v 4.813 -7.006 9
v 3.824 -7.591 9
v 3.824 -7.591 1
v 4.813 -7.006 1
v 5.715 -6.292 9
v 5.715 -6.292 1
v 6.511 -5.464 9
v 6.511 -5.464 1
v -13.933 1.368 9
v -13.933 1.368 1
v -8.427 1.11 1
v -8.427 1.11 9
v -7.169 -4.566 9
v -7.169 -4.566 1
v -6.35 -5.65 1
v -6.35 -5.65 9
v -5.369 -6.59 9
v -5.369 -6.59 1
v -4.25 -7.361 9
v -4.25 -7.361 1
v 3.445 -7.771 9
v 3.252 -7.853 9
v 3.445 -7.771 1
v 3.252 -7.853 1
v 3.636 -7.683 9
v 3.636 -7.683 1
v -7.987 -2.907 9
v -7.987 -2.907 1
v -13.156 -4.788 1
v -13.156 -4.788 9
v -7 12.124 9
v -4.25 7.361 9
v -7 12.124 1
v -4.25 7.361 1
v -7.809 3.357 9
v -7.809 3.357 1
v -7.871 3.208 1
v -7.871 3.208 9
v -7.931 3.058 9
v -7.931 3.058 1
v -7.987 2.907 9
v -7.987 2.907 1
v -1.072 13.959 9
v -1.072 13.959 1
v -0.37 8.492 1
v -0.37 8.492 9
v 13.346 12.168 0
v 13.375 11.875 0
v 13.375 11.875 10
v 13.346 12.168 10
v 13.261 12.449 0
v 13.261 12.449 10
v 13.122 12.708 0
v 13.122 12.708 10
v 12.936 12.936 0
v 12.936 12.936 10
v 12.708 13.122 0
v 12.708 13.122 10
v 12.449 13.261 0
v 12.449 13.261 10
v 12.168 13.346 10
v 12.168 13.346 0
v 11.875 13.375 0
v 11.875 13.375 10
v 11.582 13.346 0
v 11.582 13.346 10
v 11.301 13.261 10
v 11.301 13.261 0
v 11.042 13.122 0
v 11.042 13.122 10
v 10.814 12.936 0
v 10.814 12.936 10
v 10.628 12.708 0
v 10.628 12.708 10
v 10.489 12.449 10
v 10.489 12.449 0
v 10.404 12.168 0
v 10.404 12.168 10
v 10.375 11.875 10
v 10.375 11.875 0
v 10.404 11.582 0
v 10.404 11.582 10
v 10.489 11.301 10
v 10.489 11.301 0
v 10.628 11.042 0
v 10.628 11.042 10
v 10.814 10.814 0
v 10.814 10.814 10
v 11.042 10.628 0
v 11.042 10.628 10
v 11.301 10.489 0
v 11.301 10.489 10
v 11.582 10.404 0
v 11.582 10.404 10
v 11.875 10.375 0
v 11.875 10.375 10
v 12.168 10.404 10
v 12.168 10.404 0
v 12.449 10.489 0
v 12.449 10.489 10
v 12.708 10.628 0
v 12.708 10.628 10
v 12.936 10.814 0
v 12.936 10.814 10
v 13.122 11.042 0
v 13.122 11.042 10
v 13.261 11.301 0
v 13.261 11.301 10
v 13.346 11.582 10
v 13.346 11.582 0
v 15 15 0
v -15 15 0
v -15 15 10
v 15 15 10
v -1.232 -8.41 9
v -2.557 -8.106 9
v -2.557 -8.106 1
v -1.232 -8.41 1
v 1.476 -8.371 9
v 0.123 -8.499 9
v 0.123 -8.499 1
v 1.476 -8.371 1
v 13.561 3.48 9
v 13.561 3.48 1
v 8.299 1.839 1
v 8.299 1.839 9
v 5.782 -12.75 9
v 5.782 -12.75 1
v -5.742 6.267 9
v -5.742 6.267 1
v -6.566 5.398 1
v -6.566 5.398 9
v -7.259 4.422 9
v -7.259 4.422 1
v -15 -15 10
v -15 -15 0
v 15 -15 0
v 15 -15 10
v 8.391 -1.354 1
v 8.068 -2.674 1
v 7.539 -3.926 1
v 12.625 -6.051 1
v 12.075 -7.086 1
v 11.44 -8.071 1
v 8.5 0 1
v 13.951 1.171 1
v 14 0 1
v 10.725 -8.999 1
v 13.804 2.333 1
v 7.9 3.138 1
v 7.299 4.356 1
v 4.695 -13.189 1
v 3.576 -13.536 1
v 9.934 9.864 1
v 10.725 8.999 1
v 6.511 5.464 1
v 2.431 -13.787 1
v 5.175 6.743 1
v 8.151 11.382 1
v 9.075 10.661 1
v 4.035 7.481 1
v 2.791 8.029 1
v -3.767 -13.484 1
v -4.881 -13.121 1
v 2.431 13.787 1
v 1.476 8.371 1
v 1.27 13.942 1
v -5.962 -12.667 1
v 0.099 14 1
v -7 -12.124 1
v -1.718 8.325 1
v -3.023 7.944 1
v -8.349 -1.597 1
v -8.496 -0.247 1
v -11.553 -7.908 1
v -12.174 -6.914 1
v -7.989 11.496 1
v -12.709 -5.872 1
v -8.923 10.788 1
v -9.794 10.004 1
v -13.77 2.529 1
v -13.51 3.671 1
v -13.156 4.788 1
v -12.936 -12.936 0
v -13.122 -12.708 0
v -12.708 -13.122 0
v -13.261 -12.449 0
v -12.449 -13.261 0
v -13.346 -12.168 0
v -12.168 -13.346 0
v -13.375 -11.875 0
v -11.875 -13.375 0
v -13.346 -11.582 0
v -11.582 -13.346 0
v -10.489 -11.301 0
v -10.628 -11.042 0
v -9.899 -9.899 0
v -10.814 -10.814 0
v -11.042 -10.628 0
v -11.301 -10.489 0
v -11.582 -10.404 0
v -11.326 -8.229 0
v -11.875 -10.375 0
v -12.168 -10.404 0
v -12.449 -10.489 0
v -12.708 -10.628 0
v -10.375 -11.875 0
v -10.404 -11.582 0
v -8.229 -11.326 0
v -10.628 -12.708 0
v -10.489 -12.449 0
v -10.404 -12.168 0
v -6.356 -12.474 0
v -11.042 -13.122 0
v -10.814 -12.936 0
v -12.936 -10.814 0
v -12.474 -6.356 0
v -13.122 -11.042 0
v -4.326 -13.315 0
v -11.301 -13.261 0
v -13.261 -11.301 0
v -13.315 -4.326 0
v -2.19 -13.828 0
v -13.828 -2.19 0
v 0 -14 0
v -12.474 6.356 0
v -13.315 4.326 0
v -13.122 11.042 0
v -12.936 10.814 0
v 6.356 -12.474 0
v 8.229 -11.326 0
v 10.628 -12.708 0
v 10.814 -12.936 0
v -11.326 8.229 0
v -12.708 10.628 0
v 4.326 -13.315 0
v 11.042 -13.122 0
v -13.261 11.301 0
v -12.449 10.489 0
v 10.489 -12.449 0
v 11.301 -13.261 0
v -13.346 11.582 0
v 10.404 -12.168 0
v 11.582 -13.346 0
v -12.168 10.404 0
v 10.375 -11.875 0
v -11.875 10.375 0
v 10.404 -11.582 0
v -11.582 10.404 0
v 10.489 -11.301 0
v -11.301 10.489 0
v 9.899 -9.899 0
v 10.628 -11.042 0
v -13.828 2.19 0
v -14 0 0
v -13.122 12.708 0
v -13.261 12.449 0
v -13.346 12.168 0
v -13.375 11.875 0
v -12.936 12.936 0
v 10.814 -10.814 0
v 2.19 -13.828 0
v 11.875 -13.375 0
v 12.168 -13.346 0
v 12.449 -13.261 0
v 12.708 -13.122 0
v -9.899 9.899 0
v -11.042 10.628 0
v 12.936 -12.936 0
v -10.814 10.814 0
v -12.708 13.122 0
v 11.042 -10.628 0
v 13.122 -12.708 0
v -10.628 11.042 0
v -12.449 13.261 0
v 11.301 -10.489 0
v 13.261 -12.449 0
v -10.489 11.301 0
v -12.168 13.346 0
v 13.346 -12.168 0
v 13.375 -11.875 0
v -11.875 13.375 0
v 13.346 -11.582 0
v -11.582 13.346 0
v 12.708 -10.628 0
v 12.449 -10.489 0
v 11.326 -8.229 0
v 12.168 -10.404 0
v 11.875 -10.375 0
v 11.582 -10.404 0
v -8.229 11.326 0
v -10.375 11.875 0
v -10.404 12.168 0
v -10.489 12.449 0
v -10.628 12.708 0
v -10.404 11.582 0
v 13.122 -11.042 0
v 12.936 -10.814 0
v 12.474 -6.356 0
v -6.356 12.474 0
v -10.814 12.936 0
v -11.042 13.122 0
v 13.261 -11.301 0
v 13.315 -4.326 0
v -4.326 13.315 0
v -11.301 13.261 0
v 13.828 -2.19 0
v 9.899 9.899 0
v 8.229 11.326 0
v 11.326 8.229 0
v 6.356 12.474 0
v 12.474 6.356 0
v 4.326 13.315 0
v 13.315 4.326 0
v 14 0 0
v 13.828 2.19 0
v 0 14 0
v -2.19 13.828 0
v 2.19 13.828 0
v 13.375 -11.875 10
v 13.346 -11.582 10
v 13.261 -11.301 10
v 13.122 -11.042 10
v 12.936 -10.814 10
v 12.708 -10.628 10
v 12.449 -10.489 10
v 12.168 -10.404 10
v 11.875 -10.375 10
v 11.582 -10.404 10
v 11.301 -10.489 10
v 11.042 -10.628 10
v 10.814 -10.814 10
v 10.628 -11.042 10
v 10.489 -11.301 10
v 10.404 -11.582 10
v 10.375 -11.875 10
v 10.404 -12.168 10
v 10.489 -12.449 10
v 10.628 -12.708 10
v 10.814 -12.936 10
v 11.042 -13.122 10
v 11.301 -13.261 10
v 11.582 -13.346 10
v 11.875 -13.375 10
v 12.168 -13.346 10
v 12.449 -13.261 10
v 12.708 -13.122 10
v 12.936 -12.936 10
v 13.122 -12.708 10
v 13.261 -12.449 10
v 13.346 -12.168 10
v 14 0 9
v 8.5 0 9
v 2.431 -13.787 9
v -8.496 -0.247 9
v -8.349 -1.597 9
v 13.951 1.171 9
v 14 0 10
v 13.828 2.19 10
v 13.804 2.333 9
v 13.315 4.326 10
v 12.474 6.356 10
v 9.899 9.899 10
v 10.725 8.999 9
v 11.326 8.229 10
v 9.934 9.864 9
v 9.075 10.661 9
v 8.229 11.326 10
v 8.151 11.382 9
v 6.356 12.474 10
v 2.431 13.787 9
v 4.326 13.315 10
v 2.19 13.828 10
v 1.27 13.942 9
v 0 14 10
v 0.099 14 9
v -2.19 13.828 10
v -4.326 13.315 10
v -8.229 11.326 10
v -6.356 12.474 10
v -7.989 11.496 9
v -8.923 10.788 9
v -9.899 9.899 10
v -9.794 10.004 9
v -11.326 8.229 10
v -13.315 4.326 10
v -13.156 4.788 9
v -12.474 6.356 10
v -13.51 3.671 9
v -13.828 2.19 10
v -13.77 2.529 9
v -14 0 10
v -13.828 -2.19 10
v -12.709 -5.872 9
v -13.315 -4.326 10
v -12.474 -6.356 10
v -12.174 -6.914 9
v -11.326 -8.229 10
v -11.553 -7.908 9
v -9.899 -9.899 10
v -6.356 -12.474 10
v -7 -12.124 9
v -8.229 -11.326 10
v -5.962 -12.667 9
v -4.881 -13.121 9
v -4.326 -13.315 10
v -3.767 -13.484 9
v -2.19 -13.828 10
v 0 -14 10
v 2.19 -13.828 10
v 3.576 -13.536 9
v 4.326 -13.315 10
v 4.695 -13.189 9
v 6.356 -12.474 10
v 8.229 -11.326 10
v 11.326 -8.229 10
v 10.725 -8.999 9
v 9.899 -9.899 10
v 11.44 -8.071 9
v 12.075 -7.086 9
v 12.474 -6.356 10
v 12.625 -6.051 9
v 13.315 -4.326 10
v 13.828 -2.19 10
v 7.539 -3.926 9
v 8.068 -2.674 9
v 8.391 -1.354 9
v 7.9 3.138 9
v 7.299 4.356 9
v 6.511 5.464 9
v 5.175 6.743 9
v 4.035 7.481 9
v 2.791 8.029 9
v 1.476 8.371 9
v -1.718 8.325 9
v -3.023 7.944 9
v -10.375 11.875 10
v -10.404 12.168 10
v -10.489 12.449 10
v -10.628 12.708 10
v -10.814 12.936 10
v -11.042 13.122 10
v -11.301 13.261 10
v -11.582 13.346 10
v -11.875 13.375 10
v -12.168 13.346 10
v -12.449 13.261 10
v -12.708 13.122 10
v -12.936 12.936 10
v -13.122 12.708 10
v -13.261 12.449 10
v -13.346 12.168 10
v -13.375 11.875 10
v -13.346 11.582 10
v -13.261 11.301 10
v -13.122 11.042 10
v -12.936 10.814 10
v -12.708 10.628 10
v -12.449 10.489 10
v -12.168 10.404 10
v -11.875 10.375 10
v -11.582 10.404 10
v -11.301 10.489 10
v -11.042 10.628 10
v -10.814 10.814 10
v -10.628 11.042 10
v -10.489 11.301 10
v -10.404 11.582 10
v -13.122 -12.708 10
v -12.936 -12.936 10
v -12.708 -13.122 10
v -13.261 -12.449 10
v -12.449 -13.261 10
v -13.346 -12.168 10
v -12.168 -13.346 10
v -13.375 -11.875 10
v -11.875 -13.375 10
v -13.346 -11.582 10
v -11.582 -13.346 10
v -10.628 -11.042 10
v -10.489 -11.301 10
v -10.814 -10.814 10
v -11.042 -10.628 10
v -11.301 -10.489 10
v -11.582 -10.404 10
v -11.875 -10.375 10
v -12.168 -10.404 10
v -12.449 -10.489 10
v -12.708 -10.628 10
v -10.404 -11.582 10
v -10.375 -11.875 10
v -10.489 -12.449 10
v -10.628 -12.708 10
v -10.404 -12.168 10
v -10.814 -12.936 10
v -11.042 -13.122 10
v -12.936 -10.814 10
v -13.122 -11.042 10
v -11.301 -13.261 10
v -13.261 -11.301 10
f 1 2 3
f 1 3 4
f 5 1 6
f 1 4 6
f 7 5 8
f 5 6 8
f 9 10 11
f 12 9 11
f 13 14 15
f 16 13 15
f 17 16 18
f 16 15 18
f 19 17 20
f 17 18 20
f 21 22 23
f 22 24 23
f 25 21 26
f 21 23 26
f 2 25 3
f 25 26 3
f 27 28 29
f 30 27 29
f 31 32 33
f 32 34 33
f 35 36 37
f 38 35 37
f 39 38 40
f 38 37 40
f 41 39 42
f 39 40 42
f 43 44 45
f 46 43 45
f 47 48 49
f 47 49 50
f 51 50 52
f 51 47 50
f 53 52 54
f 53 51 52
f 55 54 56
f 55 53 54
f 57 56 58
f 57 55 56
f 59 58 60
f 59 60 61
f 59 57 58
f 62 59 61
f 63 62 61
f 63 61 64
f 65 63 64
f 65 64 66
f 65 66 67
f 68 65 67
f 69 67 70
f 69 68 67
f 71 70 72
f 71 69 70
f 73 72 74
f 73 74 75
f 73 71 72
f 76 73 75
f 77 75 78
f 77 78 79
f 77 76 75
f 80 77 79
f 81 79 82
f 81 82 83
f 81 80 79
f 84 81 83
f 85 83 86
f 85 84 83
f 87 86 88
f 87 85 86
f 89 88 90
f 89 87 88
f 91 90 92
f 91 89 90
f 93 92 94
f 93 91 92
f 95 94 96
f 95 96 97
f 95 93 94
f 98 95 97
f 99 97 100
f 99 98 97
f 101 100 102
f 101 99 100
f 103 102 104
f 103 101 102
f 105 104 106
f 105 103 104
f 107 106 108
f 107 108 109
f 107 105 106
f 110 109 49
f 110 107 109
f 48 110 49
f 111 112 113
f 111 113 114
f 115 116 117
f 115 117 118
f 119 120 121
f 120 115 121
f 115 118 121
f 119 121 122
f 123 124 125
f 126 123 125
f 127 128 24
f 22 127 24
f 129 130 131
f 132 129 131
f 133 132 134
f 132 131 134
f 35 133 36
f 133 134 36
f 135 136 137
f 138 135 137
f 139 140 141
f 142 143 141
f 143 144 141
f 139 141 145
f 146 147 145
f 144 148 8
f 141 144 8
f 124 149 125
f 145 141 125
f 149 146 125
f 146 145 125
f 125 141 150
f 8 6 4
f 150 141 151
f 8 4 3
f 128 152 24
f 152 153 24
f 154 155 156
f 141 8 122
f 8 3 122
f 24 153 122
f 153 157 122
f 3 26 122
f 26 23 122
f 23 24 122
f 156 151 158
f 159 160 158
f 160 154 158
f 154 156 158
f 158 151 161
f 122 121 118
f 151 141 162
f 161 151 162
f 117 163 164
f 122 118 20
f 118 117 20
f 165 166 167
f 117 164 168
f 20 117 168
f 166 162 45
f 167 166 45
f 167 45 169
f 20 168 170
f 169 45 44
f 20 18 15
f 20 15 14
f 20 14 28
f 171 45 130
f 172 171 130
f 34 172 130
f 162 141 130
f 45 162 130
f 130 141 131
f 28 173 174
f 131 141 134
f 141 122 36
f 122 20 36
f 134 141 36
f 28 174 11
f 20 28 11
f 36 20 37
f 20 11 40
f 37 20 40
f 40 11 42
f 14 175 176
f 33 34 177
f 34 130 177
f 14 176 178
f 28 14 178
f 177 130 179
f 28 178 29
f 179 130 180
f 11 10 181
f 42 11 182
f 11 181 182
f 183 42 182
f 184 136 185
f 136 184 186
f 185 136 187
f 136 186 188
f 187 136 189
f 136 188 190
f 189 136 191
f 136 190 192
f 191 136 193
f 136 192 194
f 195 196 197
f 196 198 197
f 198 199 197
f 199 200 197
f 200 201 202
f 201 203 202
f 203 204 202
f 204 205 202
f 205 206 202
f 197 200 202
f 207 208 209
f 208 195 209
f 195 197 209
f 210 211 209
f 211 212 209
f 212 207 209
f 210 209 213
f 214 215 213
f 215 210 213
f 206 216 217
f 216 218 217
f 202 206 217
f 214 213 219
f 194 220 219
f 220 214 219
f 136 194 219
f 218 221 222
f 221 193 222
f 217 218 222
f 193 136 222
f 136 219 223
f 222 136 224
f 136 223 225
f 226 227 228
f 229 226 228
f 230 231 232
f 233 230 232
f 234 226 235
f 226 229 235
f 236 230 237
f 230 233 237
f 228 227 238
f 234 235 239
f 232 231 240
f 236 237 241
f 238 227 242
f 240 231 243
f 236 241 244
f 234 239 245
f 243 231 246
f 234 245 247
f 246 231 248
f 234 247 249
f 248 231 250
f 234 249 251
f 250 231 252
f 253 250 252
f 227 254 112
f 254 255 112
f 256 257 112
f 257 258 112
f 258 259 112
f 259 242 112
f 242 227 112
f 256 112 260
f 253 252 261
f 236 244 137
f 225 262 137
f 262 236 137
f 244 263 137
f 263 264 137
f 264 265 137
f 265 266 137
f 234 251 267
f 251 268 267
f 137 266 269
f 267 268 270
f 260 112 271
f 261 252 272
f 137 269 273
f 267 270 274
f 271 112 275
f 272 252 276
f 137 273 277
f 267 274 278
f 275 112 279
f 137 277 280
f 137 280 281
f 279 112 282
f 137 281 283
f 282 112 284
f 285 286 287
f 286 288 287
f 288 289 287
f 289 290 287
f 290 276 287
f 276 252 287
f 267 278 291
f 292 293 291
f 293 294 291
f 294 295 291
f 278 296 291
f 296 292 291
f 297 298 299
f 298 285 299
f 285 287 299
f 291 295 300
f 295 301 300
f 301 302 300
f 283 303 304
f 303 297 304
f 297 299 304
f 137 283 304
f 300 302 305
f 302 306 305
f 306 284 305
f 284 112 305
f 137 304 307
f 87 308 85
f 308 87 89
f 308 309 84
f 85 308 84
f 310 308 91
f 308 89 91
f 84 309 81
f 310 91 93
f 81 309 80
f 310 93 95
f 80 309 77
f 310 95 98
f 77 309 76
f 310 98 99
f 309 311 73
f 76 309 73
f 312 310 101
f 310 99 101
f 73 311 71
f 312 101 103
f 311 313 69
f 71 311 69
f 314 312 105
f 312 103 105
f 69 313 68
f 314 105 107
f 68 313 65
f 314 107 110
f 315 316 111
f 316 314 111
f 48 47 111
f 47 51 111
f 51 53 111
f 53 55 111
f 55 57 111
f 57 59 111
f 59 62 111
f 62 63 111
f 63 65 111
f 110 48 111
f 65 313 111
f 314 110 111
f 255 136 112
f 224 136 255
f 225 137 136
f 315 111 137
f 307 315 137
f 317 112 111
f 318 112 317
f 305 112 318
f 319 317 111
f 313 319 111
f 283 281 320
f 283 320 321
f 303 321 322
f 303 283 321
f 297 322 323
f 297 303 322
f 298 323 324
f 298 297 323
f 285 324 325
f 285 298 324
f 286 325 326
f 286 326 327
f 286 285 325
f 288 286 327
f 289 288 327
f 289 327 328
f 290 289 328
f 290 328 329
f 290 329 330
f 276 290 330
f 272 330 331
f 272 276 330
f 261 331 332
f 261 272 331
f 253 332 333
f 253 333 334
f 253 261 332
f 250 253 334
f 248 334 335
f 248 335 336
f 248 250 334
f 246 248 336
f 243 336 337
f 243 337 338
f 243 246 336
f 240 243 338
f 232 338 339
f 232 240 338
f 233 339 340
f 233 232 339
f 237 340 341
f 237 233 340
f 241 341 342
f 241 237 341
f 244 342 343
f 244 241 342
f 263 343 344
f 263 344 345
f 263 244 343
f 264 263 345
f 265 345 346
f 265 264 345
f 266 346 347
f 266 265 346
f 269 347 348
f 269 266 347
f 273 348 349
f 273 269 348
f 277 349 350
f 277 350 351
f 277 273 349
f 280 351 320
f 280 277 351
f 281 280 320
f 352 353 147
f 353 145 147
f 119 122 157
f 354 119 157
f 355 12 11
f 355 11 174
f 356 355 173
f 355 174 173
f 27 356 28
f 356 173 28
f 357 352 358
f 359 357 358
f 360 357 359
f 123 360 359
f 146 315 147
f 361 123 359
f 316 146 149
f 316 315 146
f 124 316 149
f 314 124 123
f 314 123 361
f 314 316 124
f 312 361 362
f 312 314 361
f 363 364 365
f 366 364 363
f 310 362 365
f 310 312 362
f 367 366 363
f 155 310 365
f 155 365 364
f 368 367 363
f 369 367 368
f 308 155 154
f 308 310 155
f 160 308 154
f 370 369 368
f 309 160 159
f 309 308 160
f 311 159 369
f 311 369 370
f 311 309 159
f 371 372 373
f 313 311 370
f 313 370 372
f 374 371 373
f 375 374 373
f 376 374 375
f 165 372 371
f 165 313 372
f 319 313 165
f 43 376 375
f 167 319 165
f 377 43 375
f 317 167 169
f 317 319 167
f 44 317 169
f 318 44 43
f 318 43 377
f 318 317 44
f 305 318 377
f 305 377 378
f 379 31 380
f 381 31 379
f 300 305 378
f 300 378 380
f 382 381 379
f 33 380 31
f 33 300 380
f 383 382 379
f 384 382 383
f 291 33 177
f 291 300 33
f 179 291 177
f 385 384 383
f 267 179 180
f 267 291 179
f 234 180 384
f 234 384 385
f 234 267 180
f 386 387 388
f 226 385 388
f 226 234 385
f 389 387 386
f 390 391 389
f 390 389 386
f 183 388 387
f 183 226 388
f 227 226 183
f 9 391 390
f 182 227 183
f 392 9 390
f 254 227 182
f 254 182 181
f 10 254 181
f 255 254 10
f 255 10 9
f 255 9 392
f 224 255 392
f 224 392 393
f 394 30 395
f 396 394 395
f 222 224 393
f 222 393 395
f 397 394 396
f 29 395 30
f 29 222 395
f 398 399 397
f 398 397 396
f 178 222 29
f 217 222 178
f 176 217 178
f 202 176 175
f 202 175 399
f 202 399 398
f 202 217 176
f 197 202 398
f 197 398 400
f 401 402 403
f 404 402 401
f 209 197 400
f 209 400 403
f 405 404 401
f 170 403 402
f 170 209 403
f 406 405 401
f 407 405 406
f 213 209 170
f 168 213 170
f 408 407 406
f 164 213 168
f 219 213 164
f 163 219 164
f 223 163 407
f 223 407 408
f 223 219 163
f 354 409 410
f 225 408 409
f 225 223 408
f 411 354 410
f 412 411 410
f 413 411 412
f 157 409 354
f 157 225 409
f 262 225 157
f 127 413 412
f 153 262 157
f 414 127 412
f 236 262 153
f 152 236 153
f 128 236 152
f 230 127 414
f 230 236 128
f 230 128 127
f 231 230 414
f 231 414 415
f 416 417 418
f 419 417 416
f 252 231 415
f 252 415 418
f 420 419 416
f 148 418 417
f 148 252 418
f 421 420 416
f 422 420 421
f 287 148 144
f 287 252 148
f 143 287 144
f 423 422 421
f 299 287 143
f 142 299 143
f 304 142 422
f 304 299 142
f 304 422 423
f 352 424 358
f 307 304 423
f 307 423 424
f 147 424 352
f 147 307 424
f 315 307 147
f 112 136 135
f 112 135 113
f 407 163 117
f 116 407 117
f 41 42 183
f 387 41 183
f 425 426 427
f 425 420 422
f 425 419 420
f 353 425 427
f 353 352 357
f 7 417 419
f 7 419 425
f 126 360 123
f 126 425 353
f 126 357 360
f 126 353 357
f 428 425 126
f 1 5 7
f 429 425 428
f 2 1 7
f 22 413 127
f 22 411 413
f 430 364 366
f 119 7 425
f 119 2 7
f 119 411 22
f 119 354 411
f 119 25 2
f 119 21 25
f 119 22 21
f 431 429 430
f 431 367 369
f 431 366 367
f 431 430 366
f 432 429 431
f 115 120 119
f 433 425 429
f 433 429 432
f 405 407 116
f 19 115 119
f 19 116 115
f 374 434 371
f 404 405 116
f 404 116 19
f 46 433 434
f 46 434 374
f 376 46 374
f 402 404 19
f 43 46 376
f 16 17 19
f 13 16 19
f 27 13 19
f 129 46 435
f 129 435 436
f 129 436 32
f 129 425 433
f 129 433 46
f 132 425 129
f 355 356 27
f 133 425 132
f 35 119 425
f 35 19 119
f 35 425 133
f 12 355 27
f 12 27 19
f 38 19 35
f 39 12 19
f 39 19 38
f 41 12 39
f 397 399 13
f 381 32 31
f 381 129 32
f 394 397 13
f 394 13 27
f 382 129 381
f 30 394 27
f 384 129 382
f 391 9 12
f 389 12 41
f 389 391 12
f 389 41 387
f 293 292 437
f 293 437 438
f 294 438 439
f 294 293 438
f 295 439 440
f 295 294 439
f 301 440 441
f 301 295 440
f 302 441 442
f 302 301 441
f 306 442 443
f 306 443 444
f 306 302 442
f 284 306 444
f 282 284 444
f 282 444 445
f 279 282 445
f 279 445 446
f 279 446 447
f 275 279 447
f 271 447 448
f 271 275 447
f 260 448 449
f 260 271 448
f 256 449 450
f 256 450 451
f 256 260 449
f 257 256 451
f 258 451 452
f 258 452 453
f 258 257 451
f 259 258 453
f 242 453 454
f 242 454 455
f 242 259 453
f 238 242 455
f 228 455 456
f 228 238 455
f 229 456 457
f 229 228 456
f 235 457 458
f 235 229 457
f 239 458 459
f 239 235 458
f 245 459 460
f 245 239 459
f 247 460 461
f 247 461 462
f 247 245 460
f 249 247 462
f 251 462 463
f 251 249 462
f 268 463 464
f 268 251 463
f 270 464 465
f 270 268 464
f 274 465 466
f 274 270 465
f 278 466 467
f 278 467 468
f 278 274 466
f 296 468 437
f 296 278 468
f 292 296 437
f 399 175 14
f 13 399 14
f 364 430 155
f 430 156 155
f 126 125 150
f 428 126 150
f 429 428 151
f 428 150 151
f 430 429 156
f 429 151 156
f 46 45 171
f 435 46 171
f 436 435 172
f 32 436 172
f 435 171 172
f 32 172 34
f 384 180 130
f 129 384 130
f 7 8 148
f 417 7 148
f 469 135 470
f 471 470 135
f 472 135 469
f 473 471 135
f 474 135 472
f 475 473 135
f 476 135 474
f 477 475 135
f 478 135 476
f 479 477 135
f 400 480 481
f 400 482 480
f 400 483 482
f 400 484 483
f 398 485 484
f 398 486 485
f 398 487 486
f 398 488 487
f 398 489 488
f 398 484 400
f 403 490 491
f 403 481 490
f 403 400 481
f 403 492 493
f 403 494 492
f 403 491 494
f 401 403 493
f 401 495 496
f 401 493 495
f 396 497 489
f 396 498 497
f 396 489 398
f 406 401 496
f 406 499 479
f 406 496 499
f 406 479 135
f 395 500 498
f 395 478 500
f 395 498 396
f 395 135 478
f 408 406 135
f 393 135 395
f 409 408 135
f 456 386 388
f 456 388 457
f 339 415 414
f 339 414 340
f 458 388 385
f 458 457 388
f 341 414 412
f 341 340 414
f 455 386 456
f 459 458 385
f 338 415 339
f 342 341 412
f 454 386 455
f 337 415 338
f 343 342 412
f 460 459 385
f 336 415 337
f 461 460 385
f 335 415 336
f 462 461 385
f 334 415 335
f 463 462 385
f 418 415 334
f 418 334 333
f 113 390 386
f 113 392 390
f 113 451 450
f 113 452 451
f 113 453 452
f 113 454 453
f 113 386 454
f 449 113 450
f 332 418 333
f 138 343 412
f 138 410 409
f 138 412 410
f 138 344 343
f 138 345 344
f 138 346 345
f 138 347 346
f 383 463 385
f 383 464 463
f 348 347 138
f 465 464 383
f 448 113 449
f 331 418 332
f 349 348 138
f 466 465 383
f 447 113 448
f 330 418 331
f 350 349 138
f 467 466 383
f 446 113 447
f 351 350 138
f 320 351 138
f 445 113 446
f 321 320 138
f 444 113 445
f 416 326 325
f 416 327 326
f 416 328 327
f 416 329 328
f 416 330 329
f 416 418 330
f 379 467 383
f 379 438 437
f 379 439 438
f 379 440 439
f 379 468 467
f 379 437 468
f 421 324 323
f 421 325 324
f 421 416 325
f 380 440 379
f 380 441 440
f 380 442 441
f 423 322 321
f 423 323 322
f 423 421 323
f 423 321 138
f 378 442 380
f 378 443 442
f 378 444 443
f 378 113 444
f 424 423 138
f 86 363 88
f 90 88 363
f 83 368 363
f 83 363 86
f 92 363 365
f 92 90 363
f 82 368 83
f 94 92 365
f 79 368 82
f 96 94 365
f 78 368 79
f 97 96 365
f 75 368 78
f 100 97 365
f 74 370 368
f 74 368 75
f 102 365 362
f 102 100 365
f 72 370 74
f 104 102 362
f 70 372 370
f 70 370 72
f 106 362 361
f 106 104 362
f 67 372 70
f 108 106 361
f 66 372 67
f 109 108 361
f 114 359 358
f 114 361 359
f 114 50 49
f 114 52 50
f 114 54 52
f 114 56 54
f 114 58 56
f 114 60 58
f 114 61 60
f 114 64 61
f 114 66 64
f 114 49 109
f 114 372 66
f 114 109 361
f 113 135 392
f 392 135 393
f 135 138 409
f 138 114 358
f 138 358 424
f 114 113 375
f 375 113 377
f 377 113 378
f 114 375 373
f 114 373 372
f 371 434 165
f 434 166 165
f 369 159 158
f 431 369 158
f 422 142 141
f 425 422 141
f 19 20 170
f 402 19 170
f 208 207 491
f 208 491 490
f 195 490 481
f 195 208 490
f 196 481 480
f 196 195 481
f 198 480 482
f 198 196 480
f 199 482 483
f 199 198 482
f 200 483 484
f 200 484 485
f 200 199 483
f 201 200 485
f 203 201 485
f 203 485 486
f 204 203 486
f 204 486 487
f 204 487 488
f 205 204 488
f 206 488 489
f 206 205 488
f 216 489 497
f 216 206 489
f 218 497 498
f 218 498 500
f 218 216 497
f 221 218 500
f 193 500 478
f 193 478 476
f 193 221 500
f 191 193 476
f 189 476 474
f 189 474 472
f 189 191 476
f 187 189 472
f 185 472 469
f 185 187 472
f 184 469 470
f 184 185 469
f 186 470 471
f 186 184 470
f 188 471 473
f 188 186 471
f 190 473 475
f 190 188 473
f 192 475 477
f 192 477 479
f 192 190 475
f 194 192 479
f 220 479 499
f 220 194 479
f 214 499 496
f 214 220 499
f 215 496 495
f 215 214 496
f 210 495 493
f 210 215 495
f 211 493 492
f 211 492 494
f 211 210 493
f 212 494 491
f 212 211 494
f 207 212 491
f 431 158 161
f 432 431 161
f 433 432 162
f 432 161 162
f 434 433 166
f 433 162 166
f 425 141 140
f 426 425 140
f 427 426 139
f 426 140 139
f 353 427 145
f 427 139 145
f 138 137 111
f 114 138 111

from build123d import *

# Parameters (mm, degrees)
SKETCH051_W           = 30
SKETCH051_H           = 30
SKETCH051_R           = 14
SKETCH051_R_2         = 1.5
PAD022_DEPTH          = 10
PAD023_DEPTH          = 8
POLARPATTERN001_COUNT = 9


with BuildPart() as part:
    # Sketch051 → Pad022 (new body)
    with BuildSketch(Plane.XY):
        Rectangle(SKETCH051_W, SKETCH051_H)
        Circle(SKETCH051_R, mode=Mode.SUBTRACT)
        with Locations((-11.875, 11.875)):
            Circle(SKETCH051_R_2, mode=Mode.SUBTRACT)
        with Locations((11.875, 11.875)):
            Circle(SKETCH051_R_2, mode=Mode.SUBTRACT)
        with Locations((-11.875, -11.875)):
            Circle(SKETCH051_R_2, mode=Mode.SUBTRACT)
        with Locations((11.875, -11.875)):
            Circle(SKETCH051_R_2, mode=Mode.SUBTRACT)
    extrude(amount=PAD022_DEPTH)

    # Sketch052 → Pad023 (join)
    with BuildSketch(Plane.XY.offset(1)):
        with BuildLine():
            ThreePointArc((8.298704, 1.838887), (-8.449526, -0.924936), (8.5, 0))
            Line((8.5, 0), (14.143682, 0))
            Line((14.143682, 0), (13.972063, 3.60798))
            Line((13.972063, 3.60798), (8.298704, 1.838887))
        make_face()
    pad023 = extrude(amount=PAD023_DEPTH)

    # PolarPattern001: Pad023 ×9 about axis
    polarpattern001_axis = Axis((0, 0, 1), (0, 0, 1))
    for i in range(1, POLARPATTERN001_COUNT):
        add(pad023.rotate(polarpattern001_axis, i * 360 / POLARPATTERN001_COUNT))


solid = part.part
